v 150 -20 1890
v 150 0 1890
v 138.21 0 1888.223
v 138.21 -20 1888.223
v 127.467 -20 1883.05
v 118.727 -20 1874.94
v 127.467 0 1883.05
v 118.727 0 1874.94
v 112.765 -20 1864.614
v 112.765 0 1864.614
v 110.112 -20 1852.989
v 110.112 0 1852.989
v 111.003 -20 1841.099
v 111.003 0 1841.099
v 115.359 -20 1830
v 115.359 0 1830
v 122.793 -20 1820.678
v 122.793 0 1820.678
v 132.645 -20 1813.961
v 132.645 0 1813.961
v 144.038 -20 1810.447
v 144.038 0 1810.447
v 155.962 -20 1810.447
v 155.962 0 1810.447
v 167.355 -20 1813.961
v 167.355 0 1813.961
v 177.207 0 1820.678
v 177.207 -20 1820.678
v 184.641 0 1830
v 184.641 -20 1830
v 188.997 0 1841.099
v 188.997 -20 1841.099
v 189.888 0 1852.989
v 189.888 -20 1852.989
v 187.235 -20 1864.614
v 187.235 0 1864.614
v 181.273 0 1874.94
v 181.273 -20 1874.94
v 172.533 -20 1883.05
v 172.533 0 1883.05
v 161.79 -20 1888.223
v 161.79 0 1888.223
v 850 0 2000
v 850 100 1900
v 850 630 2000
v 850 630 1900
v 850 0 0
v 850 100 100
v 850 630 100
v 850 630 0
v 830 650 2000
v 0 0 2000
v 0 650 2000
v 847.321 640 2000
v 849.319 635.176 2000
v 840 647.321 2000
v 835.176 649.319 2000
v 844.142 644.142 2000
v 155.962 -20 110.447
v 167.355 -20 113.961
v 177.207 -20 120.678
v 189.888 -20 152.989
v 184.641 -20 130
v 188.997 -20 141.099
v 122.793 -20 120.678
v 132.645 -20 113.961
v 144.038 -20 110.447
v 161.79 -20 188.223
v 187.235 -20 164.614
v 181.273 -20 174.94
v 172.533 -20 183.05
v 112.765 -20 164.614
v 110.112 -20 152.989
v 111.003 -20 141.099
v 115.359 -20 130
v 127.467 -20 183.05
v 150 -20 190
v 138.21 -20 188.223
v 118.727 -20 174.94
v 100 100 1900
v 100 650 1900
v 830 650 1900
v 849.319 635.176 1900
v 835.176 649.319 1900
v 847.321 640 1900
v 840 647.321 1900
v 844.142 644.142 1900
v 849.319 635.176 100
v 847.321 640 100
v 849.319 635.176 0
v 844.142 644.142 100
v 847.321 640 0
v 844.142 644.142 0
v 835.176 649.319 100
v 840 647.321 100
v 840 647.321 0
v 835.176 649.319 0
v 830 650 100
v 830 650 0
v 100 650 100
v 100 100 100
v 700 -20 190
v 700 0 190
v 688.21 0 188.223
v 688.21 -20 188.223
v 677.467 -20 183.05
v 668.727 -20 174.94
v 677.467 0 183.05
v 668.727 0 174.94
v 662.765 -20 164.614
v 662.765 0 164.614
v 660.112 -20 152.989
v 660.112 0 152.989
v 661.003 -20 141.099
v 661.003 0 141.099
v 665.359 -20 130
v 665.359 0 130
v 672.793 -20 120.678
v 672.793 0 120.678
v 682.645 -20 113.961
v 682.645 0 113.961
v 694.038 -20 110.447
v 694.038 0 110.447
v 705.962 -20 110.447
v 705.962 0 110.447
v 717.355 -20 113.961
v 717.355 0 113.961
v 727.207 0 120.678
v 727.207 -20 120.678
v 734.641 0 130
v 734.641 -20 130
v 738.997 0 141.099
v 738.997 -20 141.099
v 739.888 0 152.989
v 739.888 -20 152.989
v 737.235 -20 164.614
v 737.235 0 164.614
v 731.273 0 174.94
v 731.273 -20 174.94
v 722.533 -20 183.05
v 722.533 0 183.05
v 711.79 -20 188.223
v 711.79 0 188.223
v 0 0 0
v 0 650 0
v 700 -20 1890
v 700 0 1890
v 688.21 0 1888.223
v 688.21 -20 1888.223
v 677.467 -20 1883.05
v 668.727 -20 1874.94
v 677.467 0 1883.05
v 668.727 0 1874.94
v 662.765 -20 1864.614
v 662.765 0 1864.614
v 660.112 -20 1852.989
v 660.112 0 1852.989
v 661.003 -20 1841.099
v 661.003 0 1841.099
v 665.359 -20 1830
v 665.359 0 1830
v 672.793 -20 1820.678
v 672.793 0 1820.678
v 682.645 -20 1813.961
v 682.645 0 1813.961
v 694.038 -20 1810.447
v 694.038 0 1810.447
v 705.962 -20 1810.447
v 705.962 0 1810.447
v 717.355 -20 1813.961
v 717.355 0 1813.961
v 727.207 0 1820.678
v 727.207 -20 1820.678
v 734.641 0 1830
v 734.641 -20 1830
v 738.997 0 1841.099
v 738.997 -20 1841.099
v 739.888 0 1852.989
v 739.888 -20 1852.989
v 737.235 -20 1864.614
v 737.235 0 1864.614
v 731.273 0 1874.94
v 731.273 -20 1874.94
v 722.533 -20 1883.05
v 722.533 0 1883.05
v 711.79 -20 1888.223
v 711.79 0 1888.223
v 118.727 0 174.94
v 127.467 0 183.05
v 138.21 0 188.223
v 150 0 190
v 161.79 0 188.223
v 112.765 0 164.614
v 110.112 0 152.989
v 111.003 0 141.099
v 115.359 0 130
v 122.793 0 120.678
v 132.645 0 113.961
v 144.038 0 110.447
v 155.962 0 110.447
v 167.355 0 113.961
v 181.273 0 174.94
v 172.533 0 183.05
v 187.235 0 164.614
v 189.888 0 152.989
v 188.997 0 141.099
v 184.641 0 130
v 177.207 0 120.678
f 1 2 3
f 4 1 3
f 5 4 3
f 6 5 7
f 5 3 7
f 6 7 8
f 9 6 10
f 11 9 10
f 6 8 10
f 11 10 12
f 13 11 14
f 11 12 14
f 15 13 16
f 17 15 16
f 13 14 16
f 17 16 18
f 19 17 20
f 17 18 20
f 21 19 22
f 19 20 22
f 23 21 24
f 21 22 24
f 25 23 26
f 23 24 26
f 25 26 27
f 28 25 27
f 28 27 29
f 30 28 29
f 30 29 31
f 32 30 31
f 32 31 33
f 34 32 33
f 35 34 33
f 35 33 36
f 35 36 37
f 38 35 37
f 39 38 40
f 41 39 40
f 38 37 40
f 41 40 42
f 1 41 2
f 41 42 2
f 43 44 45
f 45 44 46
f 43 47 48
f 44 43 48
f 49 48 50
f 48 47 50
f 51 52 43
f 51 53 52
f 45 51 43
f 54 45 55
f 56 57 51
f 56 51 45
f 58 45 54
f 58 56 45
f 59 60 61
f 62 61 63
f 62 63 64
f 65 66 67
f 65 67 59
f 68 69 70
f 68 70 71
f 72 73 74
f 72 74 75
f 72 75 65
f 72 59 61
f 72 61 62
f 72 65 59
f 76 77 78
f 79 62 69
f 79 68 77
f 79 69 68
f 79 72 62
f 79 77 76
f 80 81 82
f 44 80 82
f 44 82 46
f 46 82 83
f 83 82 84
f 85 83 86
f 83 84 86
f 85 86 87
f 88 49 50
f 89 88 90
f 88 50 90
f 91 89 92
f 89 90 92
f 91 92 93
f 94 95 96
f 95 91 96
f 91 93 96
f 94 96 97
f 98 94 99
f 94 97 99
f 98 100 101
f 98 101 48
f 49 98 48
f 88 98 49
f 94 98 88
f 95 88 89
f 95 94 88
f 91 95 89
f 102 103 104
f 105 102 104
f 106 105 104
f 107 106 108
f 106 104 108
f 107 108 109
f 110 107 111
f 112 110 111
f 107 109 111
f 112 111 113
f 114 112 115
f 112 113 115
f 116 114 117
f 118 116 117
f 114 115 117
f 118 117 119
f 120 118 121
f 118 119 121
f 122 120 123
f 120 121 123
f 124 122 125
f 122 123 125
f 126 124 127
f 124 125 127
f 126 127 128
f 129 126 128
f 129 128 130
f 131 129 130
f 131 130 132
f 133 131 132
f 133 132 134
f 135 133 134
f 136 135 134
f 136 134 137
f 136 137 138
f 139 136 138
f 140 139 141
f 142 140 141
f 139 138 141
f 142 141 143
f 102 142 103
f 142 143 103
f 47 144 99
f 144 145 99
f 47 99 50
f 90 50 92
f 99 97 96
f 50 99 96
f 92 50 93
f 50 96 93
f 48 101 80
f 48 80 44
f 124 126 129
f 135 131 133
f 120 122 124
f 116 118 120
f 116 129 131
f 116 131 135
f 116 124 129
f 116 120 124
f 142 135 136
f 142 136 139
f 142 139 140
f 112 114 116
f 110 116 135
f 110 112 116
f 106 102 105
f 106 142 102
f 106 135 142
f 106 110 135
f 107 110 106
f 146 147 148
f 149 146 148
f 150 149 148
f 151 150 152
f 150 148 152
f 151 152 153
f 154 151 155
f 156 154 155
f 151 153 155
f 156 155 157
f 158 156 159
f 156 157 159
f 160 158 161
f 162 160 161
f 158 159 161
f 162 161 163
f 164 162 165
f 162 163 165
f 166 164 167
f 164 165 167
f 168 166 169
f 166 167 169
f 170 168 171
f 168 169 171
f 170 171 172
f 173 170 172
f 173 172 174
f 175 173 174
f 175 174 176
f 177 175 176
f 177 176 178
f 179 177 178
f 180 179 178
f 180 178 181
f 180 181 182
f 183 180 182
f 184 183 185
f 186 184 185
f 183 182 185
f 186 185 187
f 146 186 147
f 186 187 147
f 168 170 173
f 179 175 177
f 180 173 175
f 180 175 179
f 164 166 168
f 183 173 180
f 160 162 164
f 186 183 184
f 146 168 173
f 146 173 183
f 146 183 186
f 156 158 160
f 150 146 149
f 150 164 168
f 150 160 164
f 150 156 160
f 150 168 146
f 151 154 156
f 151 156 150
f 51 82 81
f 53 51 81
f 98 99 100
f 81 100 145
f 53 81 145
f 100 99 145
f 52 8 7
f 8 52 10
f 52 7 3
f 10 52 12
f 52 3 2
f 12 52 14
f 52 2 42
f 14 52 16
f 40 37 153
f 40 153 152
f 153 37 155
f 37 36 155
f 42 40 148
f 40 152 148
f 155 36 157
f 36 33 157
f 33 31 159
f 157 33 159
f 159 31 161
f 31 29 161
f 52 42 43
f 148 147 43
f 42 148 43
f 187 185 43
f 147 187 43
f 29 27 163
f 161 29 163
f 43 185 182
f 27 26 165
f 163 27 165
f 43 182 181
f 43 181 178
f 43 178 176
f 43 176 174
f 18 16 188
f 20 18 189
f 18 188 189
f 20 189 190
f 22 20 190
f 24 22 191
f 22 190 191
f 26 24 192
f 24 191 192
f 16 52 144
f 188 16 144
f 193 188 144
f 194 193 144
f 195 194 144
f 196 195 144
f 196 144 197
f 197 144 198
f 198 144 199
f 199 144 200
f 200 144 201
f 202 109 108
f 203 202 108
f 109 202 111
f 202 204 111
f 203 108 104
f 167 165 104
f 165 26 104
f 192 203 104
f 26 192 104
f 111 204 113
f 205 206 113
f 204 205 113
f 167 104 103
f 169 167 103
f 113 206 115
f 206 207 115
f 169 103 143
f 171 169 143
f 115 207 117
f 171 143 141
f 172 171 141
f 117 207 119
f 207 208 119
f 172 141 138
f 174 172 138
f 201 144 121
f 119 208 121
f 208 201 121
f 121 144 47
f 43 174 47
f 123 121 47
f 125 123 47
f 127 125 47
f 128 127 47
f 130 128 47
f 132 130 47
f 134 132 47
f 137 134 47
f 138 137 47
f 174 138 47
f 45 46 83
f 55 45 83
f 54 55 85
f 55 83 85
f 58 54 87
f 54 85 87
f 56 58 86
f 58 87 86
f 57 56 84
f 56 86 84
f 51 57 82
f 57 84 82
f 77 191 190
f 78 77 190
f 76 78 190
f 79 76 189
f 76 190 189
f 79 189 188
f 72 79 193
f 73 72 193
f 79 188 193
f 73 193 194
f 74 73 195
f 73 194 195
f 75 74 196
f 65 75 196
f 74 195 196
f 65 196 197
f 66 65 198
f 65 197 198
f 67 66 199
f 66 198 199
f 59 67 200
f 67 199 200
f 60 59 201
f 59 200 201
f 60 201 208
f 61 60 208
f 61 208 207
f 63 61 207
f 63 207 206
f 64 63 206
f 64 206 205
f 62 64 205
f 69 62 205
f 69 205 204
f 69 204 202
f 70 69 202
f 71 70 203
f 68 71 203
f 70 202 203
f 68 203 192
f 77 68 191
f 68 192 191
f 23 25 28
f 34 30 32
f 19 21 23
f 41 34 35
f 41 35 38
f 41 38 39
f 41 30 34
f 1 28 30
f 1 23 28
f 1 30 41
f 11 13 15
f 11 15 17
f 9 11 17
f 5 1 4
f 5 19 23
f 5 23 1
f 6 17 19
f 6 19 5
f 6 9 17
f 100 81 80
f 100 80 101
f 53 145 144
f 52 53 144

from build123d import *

# Parameters (mm, degrees)
BOSS_EXTRUDE1_DEPTH = 2000
SKETCH2_W           = 1015.39839311
SKETCH2_H           = 1800
CUT_EXTRUDE1_DEPTH  = 550
SKETCH3_R           = 40
BOSS_EXTRUDE2_DEPTH = 20


with BuildPart() as part:
    # Sketch1 → Boss-Extrude1 (new body)
    with BuildSketch(Plane.XY):
        with BuildLine():
            Line((0, 0), (850, 0))
            Line((850, 0), (850, 630))
            ThreePointArc((850, 630), (844.142135624, 644.142135624), (830, 650))
            Line((830, 650), (0, 650))
            Line((0, 650), (0, 0))
        make_face()
    extrude(amount=BOSS_EXTRUDE1_DEPTH)

    # Sketch2 → Cut-Extrude1 (cut)
    with BuildSketch(Plane(origin=(0, 650, 0), x_dir=(1, 0, 0), z_dir=(0, 1, 0))):
        with Locations((607.699196555, -1000)):
            Rectangle(SKETCH2_W, SKETCH2_H)
    extrude(amount=-CUT_EXTRUDE1_DEPTH, mode=Mode.SUBTRACT)

    # Sketch3 → Boss-Extrude2 (add)
    with BuildSketch(Plane.XZ):
        with Locations(Location((150, 1850, 0), (0, 0, 90))):
            Circle(SKETCH3_R)
        with Locations(Location((700, 1850, 0), (0, 0, 90))):
            Circle(SKETCH3_R)
        with Locations(Location((700, 150, 0), (0, 0, 90))):
            Circle(SKETCH3_R)
        with Locations(Location((150, 150, 0), (0, 0, 90))):
            Circle(SKETCH3_R)
    extrude(amount=BOSS_EXTRUDE2_DEPTH)


solid = part.part
